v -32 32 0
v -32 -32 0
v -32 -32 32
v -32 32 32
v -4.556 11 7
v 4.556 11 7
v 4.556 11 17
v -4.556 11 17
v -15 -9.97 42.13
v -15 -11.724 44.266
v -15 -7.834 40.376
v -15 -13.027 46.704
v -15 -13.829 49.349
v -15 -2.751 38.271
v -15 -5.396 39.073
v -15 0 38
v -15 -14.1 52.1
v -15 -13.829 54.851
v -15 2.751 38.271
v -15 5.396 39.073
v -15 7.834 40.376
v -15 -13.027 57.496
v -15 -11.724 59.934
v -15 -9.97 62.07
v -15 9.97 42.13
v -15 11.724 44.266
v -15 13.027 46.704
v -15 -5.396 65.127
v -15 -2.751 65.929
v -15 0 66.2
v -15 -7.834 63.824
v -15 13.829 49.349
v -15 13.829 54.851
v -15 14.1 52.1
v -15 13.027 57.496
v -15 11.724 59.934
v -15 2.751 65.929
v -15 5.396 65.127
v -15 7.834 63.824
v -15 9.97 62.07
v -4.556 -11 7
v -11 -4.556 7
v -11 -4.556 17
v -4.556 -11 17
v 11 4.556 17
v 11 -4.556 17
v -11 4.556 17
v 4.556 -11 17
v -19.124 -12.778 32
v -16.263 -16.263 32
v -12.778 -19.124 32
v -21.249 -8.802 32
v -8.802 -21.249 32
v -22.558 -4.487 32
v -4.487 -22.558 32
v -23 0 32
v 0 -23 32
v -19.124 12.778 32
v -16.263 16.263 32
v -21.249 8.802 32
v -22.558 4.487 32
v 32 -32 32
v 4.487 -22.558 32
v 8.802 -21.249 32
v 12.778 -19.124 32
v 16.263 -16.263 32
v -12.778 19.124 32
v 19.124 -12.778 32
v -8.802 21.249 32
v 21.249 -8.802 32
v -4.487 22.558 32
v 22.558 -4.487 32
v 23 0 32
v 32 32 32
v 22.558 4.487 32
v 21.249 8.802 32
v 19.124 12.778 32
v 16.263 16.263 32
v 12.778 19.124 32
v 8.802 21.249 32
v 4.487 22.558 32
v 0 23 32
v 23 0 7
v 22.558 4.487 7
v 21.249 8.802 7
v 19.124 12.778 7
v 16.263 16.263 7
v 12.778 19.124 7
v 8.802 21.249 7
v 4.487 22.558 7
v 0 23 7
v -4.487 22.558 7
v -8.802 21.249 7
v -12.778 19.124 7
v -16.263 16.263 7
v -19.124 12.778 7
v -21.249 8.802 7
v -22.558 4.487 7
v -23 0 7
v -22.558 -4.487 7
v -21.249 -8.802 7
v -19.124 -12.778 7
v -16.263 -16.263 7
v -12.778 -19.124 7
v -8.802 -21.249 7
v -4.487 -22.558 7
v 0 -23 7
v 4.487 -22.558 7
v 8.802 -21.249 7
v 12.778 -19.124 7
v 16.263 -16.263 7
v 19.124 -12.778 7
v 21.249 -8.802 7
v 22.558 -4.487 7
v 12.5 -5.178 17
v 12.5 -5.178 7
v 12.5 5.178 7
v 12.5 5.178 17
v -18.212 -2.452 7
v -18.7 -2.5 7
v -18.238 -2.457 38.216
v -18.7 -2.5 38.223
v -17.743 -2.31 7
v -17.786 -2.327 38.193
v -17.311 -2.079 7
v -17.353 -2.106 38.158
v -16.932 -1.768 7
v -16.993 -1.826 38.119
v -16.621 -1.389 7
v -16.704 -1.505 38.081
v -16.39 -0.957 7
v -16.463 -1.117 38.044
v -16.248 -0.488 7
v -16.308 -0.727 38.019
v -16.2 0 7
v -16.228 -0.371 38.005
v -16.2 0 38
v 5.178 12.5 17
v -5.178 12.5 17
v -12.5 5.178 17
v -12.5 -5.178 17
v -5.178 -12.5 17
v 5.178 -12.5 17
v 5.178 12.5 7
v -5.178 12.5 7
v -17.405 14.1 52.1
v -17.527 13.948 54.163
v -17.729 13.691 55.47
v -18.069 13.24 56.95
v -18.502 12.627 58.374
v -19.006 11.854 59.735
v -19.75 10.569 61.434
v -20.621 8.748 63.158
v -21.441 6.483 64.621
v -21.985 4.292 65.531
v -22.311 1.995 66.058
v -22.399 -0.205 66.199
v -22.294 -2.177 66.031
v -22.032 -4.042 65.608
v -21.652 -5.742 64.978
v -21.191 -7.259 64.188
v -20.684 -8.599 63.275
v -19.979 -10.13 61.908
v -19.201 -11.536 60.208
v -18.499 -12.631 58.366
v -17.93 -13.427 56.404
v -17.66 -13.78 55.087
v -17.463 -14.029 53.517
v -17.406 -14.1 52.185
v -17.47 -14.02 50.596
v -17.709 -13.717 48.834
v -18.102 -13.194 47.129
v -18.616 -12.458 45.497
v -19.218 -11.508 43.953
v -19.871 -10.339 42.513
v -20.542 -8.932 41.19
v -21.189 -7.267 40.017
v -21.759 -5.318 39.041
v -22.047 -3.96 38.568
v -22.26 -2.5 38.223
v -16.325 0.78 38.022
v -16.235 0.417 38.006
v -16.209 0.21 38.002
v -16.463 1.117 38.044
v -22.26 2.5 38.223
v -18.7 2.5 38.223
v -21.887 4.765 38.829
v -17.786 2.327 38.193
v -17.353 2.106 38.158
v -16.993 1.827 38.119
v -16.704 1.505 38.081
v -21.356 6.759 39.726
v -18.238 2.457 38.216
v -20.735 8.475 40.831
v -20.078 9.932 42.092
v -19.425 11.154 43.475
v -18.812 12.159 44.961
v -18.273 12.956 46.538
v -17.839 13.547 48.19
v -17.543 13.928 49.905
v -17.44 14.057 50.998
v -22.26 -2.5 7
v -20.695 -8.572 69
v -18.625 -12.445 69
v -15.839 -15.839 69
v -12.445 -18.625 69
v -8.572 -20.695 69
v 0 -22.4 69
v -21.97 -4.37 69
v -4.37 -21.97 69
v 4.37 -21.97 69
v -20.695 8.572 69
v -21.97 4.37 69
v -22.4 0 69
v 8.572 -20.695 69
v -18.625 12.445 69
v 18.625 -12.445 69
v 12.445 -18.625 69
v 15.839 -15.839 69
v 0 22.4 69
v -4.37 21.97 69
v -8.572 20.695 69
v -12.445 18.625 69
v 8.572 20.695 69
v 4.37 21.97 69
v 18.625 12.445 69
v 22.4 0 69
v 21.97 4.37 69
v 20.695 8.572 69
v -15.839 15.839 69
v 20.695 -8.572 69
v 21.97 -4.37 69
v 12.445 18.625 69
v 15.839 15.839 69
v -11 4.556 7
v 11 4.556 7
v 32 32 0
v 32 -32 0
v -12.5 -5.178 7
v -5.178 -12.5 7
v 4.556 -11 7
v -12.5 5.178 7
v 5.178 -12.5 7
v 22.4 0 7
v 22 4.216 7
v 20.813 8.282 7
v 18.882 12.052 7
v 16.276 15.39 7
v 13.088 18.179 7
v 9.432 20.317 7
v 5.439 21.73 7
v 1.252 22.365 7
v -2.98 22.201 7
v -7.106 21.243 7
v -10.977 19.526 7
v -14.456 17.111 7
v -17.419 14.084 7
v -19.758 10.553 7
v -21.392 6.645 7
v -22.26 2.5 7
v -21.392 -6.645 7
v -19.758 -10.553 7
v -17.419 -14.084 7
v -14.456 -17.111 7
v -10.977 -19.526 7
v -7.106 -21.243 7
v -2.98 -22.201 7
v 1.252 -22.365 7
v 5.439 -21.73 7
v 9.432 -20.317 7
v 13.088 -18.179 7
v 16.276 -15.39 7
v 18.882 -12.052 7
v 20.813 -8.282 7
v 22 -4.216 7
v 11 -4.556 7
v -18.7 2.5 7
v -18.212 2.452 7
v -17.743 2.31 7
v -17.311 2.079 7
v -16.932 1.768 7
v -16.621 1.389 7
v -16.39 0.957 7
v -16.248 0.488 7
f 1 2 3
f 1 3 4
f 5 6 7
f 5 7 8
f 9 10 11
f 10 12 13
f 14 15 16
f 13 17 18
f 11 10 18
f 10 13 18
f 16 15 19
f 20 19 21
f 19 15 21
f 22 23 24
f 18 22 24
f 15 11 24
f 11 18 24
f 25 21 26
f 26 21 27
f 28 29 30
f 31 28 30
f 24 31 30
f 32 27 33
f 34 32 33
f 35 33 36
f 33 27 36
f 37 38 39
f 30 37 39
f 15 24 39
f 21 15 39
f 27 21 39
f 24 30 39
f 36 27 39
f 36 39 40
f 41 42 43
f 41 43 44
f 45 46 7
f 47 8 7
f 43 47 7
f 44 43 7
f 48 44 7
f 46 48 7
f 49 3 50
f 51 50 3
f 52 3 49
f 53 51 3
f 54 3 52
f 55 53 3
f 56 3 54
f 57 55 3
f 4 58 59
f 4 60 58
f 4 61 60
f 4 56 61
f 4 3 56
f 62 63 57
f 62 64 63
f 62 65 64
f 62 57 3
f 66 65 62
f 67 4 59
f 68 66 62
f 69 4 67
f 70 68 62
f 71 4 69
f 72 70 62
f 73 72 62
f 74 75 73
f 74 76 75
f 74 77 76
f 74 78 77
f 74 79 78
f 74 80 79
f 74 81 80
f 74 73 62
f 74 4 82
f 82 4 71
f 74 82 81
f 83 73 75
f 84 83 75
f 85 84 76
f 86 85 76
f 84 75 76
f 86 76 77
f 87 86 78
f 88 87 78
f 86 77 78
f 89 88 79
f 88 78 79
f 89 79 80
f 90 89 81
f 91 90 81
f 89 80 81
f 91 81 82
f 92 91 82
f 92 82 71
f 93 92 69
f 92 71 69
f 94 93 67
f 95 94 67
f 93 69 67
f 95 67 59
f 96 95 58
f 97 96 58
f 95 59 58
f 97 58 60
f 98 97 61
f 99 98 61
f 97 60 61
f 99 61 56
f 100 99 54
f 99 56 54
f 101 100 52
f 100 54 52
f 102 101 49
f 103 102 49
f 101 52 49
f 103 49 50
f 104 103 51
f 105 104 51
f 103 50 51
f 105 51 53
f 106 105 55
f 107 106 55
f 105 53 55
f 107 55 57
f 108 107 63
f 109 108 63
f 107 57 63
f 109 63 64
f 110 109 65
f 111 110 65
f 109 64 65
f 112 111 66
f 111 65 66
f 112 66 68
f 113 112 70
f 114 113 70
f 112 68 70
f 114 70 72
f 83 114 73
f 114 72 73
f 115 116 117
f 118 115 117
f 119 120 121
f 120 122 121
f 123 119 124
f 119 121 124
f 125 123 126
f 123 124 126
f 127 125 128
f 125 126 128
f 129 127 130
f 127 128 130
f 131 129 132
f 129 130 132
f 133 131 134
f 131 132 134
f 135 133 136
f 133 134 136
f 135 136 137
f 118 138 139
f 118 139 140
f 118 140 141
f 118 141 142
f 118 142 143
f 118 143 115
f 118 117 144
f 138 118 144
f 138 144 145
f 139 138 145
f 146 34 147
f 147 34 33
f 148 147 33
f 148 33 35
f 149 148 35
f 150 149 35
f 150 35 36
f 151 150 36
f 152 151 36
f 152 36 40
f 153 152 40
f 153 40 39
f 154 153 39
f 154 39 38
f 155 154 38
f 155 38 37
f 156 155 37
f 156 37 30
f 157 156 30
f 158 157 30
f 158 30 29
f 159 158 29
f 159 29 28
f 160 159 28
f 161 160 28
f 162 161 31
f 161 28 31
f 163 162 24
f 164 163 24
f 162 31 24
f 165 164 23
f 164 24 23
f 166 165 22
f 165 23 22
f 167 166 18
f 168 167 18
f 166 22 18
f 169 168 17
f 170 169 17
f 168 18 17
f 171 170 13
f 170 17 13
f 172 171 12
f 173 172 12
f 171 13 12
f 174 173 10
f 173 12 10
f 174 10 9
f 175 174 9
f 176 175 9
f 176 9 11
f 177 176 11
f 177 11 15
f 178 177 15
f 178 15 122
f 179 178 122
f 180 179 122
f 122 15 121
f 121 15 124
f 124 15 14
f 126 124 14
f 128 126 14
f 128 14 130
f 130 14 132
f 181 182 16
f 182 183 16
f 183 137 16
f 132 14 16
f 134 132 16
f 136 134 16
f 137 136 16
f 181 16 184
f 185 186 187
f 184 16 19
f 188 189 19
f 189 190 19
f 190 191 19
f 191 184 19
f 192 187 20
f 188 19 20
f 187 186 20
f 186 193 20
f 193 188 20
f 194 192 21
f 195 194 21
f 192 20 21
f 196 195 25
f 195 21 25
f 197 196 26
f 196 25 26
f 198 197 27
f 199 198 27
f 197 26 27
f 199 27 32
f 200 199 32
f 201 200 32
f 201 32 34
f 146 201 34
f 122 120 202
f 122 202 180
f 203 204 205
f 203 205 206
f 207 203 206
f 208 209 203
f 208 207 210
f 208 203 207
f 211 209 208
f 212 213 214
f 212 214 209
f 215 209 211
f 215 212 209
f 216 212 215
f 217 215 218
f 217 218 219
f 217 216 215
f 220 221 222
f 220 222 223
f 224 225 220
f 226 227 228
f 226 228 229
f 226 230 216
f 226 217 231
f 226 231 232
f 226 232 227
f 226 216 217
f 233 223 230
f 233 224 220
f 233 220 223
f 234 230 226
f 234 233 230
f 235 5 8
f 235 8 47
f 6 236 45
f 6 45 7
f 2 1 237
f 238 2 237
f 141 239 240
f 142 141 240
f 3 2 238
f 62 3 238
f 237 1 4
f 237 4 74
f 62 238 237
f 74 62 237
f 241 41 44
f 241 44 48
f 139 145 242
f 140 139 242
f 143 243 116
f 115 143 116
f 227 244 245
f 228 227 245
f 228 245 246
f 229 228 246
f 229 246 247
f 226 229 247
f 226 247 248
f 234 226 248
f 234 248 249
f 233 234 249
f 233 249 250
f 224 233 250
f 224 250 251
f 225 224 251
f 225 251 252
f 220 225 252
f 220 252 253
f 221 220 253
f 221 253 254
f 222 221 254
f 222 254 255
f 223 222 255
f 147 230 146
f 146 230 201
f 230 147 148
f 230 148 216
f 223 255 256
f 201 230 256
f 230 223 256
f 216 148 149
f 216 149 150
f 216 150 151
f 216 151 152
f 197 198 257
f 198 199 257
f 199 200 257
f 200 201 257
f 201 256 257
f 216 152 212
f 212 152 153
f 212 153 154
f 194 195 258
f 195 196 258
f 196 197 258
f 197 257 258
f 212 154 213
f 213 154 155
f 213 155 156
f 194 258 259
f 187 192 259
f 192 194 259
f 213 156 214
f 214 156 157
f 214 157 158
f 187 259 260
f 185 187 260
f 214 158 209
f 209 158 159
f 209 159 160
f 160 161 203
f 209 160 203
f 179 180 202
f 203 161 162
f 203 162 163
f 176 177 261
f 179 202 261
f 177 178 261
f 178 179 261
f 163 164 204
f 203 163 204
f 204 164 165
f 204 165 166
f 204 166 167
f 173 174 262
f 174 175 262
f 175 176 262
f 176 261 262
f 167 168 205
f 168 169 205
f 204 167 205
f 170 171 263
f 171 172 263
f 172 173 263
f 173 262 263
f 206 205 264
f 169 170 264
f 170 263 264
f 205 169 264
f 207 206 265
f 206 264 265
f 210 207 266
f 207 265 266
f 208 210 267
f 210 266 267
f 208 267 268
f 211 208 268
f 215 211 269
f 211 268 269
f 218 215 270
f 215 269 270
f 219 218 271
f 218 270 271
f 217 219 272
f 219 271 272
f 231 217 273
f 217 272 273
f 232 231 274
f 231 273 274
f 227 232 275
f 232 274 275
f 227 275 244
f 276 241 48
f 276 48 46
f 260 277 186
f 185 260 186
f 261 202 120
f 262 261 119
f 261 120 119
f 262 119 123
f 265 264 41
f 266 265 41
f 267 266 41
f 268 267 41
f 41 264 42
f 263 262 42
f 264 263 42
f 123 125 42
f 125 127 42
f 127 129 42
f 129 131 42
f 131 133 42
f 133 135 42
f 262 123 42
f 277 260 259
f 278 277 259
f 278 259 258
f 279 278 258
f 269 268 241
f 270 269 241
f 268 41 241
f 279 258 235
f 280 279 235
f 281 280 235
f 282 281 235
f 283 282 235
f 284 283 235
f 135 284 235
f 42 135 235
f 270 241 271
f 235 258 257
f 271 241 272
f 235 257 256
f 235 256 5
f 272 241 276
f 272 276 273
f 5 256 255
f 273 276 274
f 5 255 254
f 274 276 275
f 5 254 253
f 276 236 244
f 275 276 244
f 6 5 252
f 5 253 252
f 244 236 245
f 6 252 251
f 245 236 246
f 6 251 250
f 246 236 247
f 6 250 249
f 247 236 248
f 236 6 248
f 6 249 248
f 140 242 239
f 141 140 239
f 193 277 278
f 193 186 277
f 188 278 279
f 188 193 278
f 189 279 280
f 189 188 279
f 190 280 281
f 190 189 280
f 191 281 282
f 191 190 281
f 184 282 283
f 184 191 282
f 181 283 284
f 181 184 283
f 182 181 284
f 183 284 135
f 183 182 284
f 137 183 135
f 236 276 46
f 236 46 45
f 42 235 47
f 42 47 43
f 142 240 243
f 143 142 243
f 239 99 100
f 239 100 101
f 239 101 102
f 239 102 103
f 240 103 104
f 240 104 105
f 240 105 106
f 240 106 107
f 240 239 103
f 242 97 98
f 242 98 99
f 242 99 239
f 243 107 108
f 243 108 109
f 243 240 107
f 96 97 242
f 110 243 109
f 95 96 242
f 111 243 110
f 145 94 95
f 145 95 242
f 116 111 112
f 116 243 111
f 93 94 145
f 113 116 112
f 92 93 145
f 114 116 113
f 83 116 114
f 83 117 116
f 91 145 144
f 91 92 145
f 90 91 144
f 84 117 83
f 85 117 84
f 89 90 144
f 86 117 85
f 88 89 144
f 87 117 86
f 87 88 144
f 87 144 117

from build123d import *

# Parameters (mm, degrees)
F0_W      = 64
F0_H      = 64
F1_DEPTH  = 32
F2_R      = 23
F3_DEPTH  = 25
F5_R      = 22.4
F6_DEPTH  = 62
F8_START  = -15
F7_R      = 14.1
F8_DEPTH  = 22.8
F10_START = 1.2
F9_W      = 5
F9_H      = 86.7077708244
F10_DEPTH = 23.8
F11_R     = 2.4999
F13_DEPTH = 10
F15_DEPTH = 10


# Not quite as in the source:
# - a fillet or chamfer is up to 0.001 mm smaller than in the source, because OpenCascade refuses the exact size


with BuildPart() as f1:
    # F0 (on Top) → F1 (new body)
    with BuildSketch(Plane.XY):
        Rectangle(F0_W, F0_H)
    extrude(amount=F1_DEPTH)

    # F2 (on face) → F3 (cut)
    with BuildSketch(Plane.XY.offset(32)):
        Circle(F2_R)
    extrude(amount=-F3_DEPTH, mode=Mode.SUBTRACT)

    # F14 (on face) → F15 (join)
    with BuildSketch(Plane.XY.offset(7)):
        Polygon((5.1776695297, 12.5), (-5.1776695297, 12.5), (-12.5, 5.1776695297), (-12.5, -5.1776695297), (-5.1776695297, -12.5), (5.1776695297, -12.5), (12.5, -5.1776695297), (12.5, 5.1776695297), align=None)
    extrude(amount=F15_DEPTH)


with BuildPart() as f6:
    # F5 (on face) → F6 (new body)
    with BuildSketch(Plane.XY.offset(7)):
        Circle(F5_R)
    extrude(amount=F6_DEPTH)

    # F7 (on Right) → F8 (cut)
    with BuildSketch(Plane.YZ.offset(F8_START)):
        with Locations((0, 52.1)):
            Circle(F7_R)
    extrude(amount=-F8_DEPTH, mode=Mode.SUBTRACT)

    # F9 (on face) → F10 (cut)
    with BuildSketch(Plane(origin=(-15, 0, 0), x_dir=(0, -1, 0), z_dir=(-1, 0, 0)).offset(F10_START)):
        Rectangle(F9_W, F9_H)
    extrude(amount=F10_DEPTH, mode=Mode.SUBTRACT)

    # F11 (radius 2.5 in the source; OpenCascade refuses exactly that, so slightly less here)
    f11_edges = [f6.edges().sort_by_distance(p)[0] for p in [
        (-16.2, 2.5, 22.6117),
        (-16.2, -2.5, 22.6117),
    ]]
    fillet(f11_edges, radius=F11_R)

    # F12 (on face) → F13 (cut)
    with BuildSketch(Plane.XY.offset(7)):
        Polygon((11, -4.5563491861), (11, 4.5563491861), (4.5563491861, 11), (-4.5563491861, 11), (-11, 4.5563491861), (-11, -4.5563491861), (-4.5563491861, -11), (4.5563491861, -11), align=None)
    extrude(amount=F13_DEPTH, mode=Mode.SUBTRACT)


solid = Compound([f1.part, f6.part])
